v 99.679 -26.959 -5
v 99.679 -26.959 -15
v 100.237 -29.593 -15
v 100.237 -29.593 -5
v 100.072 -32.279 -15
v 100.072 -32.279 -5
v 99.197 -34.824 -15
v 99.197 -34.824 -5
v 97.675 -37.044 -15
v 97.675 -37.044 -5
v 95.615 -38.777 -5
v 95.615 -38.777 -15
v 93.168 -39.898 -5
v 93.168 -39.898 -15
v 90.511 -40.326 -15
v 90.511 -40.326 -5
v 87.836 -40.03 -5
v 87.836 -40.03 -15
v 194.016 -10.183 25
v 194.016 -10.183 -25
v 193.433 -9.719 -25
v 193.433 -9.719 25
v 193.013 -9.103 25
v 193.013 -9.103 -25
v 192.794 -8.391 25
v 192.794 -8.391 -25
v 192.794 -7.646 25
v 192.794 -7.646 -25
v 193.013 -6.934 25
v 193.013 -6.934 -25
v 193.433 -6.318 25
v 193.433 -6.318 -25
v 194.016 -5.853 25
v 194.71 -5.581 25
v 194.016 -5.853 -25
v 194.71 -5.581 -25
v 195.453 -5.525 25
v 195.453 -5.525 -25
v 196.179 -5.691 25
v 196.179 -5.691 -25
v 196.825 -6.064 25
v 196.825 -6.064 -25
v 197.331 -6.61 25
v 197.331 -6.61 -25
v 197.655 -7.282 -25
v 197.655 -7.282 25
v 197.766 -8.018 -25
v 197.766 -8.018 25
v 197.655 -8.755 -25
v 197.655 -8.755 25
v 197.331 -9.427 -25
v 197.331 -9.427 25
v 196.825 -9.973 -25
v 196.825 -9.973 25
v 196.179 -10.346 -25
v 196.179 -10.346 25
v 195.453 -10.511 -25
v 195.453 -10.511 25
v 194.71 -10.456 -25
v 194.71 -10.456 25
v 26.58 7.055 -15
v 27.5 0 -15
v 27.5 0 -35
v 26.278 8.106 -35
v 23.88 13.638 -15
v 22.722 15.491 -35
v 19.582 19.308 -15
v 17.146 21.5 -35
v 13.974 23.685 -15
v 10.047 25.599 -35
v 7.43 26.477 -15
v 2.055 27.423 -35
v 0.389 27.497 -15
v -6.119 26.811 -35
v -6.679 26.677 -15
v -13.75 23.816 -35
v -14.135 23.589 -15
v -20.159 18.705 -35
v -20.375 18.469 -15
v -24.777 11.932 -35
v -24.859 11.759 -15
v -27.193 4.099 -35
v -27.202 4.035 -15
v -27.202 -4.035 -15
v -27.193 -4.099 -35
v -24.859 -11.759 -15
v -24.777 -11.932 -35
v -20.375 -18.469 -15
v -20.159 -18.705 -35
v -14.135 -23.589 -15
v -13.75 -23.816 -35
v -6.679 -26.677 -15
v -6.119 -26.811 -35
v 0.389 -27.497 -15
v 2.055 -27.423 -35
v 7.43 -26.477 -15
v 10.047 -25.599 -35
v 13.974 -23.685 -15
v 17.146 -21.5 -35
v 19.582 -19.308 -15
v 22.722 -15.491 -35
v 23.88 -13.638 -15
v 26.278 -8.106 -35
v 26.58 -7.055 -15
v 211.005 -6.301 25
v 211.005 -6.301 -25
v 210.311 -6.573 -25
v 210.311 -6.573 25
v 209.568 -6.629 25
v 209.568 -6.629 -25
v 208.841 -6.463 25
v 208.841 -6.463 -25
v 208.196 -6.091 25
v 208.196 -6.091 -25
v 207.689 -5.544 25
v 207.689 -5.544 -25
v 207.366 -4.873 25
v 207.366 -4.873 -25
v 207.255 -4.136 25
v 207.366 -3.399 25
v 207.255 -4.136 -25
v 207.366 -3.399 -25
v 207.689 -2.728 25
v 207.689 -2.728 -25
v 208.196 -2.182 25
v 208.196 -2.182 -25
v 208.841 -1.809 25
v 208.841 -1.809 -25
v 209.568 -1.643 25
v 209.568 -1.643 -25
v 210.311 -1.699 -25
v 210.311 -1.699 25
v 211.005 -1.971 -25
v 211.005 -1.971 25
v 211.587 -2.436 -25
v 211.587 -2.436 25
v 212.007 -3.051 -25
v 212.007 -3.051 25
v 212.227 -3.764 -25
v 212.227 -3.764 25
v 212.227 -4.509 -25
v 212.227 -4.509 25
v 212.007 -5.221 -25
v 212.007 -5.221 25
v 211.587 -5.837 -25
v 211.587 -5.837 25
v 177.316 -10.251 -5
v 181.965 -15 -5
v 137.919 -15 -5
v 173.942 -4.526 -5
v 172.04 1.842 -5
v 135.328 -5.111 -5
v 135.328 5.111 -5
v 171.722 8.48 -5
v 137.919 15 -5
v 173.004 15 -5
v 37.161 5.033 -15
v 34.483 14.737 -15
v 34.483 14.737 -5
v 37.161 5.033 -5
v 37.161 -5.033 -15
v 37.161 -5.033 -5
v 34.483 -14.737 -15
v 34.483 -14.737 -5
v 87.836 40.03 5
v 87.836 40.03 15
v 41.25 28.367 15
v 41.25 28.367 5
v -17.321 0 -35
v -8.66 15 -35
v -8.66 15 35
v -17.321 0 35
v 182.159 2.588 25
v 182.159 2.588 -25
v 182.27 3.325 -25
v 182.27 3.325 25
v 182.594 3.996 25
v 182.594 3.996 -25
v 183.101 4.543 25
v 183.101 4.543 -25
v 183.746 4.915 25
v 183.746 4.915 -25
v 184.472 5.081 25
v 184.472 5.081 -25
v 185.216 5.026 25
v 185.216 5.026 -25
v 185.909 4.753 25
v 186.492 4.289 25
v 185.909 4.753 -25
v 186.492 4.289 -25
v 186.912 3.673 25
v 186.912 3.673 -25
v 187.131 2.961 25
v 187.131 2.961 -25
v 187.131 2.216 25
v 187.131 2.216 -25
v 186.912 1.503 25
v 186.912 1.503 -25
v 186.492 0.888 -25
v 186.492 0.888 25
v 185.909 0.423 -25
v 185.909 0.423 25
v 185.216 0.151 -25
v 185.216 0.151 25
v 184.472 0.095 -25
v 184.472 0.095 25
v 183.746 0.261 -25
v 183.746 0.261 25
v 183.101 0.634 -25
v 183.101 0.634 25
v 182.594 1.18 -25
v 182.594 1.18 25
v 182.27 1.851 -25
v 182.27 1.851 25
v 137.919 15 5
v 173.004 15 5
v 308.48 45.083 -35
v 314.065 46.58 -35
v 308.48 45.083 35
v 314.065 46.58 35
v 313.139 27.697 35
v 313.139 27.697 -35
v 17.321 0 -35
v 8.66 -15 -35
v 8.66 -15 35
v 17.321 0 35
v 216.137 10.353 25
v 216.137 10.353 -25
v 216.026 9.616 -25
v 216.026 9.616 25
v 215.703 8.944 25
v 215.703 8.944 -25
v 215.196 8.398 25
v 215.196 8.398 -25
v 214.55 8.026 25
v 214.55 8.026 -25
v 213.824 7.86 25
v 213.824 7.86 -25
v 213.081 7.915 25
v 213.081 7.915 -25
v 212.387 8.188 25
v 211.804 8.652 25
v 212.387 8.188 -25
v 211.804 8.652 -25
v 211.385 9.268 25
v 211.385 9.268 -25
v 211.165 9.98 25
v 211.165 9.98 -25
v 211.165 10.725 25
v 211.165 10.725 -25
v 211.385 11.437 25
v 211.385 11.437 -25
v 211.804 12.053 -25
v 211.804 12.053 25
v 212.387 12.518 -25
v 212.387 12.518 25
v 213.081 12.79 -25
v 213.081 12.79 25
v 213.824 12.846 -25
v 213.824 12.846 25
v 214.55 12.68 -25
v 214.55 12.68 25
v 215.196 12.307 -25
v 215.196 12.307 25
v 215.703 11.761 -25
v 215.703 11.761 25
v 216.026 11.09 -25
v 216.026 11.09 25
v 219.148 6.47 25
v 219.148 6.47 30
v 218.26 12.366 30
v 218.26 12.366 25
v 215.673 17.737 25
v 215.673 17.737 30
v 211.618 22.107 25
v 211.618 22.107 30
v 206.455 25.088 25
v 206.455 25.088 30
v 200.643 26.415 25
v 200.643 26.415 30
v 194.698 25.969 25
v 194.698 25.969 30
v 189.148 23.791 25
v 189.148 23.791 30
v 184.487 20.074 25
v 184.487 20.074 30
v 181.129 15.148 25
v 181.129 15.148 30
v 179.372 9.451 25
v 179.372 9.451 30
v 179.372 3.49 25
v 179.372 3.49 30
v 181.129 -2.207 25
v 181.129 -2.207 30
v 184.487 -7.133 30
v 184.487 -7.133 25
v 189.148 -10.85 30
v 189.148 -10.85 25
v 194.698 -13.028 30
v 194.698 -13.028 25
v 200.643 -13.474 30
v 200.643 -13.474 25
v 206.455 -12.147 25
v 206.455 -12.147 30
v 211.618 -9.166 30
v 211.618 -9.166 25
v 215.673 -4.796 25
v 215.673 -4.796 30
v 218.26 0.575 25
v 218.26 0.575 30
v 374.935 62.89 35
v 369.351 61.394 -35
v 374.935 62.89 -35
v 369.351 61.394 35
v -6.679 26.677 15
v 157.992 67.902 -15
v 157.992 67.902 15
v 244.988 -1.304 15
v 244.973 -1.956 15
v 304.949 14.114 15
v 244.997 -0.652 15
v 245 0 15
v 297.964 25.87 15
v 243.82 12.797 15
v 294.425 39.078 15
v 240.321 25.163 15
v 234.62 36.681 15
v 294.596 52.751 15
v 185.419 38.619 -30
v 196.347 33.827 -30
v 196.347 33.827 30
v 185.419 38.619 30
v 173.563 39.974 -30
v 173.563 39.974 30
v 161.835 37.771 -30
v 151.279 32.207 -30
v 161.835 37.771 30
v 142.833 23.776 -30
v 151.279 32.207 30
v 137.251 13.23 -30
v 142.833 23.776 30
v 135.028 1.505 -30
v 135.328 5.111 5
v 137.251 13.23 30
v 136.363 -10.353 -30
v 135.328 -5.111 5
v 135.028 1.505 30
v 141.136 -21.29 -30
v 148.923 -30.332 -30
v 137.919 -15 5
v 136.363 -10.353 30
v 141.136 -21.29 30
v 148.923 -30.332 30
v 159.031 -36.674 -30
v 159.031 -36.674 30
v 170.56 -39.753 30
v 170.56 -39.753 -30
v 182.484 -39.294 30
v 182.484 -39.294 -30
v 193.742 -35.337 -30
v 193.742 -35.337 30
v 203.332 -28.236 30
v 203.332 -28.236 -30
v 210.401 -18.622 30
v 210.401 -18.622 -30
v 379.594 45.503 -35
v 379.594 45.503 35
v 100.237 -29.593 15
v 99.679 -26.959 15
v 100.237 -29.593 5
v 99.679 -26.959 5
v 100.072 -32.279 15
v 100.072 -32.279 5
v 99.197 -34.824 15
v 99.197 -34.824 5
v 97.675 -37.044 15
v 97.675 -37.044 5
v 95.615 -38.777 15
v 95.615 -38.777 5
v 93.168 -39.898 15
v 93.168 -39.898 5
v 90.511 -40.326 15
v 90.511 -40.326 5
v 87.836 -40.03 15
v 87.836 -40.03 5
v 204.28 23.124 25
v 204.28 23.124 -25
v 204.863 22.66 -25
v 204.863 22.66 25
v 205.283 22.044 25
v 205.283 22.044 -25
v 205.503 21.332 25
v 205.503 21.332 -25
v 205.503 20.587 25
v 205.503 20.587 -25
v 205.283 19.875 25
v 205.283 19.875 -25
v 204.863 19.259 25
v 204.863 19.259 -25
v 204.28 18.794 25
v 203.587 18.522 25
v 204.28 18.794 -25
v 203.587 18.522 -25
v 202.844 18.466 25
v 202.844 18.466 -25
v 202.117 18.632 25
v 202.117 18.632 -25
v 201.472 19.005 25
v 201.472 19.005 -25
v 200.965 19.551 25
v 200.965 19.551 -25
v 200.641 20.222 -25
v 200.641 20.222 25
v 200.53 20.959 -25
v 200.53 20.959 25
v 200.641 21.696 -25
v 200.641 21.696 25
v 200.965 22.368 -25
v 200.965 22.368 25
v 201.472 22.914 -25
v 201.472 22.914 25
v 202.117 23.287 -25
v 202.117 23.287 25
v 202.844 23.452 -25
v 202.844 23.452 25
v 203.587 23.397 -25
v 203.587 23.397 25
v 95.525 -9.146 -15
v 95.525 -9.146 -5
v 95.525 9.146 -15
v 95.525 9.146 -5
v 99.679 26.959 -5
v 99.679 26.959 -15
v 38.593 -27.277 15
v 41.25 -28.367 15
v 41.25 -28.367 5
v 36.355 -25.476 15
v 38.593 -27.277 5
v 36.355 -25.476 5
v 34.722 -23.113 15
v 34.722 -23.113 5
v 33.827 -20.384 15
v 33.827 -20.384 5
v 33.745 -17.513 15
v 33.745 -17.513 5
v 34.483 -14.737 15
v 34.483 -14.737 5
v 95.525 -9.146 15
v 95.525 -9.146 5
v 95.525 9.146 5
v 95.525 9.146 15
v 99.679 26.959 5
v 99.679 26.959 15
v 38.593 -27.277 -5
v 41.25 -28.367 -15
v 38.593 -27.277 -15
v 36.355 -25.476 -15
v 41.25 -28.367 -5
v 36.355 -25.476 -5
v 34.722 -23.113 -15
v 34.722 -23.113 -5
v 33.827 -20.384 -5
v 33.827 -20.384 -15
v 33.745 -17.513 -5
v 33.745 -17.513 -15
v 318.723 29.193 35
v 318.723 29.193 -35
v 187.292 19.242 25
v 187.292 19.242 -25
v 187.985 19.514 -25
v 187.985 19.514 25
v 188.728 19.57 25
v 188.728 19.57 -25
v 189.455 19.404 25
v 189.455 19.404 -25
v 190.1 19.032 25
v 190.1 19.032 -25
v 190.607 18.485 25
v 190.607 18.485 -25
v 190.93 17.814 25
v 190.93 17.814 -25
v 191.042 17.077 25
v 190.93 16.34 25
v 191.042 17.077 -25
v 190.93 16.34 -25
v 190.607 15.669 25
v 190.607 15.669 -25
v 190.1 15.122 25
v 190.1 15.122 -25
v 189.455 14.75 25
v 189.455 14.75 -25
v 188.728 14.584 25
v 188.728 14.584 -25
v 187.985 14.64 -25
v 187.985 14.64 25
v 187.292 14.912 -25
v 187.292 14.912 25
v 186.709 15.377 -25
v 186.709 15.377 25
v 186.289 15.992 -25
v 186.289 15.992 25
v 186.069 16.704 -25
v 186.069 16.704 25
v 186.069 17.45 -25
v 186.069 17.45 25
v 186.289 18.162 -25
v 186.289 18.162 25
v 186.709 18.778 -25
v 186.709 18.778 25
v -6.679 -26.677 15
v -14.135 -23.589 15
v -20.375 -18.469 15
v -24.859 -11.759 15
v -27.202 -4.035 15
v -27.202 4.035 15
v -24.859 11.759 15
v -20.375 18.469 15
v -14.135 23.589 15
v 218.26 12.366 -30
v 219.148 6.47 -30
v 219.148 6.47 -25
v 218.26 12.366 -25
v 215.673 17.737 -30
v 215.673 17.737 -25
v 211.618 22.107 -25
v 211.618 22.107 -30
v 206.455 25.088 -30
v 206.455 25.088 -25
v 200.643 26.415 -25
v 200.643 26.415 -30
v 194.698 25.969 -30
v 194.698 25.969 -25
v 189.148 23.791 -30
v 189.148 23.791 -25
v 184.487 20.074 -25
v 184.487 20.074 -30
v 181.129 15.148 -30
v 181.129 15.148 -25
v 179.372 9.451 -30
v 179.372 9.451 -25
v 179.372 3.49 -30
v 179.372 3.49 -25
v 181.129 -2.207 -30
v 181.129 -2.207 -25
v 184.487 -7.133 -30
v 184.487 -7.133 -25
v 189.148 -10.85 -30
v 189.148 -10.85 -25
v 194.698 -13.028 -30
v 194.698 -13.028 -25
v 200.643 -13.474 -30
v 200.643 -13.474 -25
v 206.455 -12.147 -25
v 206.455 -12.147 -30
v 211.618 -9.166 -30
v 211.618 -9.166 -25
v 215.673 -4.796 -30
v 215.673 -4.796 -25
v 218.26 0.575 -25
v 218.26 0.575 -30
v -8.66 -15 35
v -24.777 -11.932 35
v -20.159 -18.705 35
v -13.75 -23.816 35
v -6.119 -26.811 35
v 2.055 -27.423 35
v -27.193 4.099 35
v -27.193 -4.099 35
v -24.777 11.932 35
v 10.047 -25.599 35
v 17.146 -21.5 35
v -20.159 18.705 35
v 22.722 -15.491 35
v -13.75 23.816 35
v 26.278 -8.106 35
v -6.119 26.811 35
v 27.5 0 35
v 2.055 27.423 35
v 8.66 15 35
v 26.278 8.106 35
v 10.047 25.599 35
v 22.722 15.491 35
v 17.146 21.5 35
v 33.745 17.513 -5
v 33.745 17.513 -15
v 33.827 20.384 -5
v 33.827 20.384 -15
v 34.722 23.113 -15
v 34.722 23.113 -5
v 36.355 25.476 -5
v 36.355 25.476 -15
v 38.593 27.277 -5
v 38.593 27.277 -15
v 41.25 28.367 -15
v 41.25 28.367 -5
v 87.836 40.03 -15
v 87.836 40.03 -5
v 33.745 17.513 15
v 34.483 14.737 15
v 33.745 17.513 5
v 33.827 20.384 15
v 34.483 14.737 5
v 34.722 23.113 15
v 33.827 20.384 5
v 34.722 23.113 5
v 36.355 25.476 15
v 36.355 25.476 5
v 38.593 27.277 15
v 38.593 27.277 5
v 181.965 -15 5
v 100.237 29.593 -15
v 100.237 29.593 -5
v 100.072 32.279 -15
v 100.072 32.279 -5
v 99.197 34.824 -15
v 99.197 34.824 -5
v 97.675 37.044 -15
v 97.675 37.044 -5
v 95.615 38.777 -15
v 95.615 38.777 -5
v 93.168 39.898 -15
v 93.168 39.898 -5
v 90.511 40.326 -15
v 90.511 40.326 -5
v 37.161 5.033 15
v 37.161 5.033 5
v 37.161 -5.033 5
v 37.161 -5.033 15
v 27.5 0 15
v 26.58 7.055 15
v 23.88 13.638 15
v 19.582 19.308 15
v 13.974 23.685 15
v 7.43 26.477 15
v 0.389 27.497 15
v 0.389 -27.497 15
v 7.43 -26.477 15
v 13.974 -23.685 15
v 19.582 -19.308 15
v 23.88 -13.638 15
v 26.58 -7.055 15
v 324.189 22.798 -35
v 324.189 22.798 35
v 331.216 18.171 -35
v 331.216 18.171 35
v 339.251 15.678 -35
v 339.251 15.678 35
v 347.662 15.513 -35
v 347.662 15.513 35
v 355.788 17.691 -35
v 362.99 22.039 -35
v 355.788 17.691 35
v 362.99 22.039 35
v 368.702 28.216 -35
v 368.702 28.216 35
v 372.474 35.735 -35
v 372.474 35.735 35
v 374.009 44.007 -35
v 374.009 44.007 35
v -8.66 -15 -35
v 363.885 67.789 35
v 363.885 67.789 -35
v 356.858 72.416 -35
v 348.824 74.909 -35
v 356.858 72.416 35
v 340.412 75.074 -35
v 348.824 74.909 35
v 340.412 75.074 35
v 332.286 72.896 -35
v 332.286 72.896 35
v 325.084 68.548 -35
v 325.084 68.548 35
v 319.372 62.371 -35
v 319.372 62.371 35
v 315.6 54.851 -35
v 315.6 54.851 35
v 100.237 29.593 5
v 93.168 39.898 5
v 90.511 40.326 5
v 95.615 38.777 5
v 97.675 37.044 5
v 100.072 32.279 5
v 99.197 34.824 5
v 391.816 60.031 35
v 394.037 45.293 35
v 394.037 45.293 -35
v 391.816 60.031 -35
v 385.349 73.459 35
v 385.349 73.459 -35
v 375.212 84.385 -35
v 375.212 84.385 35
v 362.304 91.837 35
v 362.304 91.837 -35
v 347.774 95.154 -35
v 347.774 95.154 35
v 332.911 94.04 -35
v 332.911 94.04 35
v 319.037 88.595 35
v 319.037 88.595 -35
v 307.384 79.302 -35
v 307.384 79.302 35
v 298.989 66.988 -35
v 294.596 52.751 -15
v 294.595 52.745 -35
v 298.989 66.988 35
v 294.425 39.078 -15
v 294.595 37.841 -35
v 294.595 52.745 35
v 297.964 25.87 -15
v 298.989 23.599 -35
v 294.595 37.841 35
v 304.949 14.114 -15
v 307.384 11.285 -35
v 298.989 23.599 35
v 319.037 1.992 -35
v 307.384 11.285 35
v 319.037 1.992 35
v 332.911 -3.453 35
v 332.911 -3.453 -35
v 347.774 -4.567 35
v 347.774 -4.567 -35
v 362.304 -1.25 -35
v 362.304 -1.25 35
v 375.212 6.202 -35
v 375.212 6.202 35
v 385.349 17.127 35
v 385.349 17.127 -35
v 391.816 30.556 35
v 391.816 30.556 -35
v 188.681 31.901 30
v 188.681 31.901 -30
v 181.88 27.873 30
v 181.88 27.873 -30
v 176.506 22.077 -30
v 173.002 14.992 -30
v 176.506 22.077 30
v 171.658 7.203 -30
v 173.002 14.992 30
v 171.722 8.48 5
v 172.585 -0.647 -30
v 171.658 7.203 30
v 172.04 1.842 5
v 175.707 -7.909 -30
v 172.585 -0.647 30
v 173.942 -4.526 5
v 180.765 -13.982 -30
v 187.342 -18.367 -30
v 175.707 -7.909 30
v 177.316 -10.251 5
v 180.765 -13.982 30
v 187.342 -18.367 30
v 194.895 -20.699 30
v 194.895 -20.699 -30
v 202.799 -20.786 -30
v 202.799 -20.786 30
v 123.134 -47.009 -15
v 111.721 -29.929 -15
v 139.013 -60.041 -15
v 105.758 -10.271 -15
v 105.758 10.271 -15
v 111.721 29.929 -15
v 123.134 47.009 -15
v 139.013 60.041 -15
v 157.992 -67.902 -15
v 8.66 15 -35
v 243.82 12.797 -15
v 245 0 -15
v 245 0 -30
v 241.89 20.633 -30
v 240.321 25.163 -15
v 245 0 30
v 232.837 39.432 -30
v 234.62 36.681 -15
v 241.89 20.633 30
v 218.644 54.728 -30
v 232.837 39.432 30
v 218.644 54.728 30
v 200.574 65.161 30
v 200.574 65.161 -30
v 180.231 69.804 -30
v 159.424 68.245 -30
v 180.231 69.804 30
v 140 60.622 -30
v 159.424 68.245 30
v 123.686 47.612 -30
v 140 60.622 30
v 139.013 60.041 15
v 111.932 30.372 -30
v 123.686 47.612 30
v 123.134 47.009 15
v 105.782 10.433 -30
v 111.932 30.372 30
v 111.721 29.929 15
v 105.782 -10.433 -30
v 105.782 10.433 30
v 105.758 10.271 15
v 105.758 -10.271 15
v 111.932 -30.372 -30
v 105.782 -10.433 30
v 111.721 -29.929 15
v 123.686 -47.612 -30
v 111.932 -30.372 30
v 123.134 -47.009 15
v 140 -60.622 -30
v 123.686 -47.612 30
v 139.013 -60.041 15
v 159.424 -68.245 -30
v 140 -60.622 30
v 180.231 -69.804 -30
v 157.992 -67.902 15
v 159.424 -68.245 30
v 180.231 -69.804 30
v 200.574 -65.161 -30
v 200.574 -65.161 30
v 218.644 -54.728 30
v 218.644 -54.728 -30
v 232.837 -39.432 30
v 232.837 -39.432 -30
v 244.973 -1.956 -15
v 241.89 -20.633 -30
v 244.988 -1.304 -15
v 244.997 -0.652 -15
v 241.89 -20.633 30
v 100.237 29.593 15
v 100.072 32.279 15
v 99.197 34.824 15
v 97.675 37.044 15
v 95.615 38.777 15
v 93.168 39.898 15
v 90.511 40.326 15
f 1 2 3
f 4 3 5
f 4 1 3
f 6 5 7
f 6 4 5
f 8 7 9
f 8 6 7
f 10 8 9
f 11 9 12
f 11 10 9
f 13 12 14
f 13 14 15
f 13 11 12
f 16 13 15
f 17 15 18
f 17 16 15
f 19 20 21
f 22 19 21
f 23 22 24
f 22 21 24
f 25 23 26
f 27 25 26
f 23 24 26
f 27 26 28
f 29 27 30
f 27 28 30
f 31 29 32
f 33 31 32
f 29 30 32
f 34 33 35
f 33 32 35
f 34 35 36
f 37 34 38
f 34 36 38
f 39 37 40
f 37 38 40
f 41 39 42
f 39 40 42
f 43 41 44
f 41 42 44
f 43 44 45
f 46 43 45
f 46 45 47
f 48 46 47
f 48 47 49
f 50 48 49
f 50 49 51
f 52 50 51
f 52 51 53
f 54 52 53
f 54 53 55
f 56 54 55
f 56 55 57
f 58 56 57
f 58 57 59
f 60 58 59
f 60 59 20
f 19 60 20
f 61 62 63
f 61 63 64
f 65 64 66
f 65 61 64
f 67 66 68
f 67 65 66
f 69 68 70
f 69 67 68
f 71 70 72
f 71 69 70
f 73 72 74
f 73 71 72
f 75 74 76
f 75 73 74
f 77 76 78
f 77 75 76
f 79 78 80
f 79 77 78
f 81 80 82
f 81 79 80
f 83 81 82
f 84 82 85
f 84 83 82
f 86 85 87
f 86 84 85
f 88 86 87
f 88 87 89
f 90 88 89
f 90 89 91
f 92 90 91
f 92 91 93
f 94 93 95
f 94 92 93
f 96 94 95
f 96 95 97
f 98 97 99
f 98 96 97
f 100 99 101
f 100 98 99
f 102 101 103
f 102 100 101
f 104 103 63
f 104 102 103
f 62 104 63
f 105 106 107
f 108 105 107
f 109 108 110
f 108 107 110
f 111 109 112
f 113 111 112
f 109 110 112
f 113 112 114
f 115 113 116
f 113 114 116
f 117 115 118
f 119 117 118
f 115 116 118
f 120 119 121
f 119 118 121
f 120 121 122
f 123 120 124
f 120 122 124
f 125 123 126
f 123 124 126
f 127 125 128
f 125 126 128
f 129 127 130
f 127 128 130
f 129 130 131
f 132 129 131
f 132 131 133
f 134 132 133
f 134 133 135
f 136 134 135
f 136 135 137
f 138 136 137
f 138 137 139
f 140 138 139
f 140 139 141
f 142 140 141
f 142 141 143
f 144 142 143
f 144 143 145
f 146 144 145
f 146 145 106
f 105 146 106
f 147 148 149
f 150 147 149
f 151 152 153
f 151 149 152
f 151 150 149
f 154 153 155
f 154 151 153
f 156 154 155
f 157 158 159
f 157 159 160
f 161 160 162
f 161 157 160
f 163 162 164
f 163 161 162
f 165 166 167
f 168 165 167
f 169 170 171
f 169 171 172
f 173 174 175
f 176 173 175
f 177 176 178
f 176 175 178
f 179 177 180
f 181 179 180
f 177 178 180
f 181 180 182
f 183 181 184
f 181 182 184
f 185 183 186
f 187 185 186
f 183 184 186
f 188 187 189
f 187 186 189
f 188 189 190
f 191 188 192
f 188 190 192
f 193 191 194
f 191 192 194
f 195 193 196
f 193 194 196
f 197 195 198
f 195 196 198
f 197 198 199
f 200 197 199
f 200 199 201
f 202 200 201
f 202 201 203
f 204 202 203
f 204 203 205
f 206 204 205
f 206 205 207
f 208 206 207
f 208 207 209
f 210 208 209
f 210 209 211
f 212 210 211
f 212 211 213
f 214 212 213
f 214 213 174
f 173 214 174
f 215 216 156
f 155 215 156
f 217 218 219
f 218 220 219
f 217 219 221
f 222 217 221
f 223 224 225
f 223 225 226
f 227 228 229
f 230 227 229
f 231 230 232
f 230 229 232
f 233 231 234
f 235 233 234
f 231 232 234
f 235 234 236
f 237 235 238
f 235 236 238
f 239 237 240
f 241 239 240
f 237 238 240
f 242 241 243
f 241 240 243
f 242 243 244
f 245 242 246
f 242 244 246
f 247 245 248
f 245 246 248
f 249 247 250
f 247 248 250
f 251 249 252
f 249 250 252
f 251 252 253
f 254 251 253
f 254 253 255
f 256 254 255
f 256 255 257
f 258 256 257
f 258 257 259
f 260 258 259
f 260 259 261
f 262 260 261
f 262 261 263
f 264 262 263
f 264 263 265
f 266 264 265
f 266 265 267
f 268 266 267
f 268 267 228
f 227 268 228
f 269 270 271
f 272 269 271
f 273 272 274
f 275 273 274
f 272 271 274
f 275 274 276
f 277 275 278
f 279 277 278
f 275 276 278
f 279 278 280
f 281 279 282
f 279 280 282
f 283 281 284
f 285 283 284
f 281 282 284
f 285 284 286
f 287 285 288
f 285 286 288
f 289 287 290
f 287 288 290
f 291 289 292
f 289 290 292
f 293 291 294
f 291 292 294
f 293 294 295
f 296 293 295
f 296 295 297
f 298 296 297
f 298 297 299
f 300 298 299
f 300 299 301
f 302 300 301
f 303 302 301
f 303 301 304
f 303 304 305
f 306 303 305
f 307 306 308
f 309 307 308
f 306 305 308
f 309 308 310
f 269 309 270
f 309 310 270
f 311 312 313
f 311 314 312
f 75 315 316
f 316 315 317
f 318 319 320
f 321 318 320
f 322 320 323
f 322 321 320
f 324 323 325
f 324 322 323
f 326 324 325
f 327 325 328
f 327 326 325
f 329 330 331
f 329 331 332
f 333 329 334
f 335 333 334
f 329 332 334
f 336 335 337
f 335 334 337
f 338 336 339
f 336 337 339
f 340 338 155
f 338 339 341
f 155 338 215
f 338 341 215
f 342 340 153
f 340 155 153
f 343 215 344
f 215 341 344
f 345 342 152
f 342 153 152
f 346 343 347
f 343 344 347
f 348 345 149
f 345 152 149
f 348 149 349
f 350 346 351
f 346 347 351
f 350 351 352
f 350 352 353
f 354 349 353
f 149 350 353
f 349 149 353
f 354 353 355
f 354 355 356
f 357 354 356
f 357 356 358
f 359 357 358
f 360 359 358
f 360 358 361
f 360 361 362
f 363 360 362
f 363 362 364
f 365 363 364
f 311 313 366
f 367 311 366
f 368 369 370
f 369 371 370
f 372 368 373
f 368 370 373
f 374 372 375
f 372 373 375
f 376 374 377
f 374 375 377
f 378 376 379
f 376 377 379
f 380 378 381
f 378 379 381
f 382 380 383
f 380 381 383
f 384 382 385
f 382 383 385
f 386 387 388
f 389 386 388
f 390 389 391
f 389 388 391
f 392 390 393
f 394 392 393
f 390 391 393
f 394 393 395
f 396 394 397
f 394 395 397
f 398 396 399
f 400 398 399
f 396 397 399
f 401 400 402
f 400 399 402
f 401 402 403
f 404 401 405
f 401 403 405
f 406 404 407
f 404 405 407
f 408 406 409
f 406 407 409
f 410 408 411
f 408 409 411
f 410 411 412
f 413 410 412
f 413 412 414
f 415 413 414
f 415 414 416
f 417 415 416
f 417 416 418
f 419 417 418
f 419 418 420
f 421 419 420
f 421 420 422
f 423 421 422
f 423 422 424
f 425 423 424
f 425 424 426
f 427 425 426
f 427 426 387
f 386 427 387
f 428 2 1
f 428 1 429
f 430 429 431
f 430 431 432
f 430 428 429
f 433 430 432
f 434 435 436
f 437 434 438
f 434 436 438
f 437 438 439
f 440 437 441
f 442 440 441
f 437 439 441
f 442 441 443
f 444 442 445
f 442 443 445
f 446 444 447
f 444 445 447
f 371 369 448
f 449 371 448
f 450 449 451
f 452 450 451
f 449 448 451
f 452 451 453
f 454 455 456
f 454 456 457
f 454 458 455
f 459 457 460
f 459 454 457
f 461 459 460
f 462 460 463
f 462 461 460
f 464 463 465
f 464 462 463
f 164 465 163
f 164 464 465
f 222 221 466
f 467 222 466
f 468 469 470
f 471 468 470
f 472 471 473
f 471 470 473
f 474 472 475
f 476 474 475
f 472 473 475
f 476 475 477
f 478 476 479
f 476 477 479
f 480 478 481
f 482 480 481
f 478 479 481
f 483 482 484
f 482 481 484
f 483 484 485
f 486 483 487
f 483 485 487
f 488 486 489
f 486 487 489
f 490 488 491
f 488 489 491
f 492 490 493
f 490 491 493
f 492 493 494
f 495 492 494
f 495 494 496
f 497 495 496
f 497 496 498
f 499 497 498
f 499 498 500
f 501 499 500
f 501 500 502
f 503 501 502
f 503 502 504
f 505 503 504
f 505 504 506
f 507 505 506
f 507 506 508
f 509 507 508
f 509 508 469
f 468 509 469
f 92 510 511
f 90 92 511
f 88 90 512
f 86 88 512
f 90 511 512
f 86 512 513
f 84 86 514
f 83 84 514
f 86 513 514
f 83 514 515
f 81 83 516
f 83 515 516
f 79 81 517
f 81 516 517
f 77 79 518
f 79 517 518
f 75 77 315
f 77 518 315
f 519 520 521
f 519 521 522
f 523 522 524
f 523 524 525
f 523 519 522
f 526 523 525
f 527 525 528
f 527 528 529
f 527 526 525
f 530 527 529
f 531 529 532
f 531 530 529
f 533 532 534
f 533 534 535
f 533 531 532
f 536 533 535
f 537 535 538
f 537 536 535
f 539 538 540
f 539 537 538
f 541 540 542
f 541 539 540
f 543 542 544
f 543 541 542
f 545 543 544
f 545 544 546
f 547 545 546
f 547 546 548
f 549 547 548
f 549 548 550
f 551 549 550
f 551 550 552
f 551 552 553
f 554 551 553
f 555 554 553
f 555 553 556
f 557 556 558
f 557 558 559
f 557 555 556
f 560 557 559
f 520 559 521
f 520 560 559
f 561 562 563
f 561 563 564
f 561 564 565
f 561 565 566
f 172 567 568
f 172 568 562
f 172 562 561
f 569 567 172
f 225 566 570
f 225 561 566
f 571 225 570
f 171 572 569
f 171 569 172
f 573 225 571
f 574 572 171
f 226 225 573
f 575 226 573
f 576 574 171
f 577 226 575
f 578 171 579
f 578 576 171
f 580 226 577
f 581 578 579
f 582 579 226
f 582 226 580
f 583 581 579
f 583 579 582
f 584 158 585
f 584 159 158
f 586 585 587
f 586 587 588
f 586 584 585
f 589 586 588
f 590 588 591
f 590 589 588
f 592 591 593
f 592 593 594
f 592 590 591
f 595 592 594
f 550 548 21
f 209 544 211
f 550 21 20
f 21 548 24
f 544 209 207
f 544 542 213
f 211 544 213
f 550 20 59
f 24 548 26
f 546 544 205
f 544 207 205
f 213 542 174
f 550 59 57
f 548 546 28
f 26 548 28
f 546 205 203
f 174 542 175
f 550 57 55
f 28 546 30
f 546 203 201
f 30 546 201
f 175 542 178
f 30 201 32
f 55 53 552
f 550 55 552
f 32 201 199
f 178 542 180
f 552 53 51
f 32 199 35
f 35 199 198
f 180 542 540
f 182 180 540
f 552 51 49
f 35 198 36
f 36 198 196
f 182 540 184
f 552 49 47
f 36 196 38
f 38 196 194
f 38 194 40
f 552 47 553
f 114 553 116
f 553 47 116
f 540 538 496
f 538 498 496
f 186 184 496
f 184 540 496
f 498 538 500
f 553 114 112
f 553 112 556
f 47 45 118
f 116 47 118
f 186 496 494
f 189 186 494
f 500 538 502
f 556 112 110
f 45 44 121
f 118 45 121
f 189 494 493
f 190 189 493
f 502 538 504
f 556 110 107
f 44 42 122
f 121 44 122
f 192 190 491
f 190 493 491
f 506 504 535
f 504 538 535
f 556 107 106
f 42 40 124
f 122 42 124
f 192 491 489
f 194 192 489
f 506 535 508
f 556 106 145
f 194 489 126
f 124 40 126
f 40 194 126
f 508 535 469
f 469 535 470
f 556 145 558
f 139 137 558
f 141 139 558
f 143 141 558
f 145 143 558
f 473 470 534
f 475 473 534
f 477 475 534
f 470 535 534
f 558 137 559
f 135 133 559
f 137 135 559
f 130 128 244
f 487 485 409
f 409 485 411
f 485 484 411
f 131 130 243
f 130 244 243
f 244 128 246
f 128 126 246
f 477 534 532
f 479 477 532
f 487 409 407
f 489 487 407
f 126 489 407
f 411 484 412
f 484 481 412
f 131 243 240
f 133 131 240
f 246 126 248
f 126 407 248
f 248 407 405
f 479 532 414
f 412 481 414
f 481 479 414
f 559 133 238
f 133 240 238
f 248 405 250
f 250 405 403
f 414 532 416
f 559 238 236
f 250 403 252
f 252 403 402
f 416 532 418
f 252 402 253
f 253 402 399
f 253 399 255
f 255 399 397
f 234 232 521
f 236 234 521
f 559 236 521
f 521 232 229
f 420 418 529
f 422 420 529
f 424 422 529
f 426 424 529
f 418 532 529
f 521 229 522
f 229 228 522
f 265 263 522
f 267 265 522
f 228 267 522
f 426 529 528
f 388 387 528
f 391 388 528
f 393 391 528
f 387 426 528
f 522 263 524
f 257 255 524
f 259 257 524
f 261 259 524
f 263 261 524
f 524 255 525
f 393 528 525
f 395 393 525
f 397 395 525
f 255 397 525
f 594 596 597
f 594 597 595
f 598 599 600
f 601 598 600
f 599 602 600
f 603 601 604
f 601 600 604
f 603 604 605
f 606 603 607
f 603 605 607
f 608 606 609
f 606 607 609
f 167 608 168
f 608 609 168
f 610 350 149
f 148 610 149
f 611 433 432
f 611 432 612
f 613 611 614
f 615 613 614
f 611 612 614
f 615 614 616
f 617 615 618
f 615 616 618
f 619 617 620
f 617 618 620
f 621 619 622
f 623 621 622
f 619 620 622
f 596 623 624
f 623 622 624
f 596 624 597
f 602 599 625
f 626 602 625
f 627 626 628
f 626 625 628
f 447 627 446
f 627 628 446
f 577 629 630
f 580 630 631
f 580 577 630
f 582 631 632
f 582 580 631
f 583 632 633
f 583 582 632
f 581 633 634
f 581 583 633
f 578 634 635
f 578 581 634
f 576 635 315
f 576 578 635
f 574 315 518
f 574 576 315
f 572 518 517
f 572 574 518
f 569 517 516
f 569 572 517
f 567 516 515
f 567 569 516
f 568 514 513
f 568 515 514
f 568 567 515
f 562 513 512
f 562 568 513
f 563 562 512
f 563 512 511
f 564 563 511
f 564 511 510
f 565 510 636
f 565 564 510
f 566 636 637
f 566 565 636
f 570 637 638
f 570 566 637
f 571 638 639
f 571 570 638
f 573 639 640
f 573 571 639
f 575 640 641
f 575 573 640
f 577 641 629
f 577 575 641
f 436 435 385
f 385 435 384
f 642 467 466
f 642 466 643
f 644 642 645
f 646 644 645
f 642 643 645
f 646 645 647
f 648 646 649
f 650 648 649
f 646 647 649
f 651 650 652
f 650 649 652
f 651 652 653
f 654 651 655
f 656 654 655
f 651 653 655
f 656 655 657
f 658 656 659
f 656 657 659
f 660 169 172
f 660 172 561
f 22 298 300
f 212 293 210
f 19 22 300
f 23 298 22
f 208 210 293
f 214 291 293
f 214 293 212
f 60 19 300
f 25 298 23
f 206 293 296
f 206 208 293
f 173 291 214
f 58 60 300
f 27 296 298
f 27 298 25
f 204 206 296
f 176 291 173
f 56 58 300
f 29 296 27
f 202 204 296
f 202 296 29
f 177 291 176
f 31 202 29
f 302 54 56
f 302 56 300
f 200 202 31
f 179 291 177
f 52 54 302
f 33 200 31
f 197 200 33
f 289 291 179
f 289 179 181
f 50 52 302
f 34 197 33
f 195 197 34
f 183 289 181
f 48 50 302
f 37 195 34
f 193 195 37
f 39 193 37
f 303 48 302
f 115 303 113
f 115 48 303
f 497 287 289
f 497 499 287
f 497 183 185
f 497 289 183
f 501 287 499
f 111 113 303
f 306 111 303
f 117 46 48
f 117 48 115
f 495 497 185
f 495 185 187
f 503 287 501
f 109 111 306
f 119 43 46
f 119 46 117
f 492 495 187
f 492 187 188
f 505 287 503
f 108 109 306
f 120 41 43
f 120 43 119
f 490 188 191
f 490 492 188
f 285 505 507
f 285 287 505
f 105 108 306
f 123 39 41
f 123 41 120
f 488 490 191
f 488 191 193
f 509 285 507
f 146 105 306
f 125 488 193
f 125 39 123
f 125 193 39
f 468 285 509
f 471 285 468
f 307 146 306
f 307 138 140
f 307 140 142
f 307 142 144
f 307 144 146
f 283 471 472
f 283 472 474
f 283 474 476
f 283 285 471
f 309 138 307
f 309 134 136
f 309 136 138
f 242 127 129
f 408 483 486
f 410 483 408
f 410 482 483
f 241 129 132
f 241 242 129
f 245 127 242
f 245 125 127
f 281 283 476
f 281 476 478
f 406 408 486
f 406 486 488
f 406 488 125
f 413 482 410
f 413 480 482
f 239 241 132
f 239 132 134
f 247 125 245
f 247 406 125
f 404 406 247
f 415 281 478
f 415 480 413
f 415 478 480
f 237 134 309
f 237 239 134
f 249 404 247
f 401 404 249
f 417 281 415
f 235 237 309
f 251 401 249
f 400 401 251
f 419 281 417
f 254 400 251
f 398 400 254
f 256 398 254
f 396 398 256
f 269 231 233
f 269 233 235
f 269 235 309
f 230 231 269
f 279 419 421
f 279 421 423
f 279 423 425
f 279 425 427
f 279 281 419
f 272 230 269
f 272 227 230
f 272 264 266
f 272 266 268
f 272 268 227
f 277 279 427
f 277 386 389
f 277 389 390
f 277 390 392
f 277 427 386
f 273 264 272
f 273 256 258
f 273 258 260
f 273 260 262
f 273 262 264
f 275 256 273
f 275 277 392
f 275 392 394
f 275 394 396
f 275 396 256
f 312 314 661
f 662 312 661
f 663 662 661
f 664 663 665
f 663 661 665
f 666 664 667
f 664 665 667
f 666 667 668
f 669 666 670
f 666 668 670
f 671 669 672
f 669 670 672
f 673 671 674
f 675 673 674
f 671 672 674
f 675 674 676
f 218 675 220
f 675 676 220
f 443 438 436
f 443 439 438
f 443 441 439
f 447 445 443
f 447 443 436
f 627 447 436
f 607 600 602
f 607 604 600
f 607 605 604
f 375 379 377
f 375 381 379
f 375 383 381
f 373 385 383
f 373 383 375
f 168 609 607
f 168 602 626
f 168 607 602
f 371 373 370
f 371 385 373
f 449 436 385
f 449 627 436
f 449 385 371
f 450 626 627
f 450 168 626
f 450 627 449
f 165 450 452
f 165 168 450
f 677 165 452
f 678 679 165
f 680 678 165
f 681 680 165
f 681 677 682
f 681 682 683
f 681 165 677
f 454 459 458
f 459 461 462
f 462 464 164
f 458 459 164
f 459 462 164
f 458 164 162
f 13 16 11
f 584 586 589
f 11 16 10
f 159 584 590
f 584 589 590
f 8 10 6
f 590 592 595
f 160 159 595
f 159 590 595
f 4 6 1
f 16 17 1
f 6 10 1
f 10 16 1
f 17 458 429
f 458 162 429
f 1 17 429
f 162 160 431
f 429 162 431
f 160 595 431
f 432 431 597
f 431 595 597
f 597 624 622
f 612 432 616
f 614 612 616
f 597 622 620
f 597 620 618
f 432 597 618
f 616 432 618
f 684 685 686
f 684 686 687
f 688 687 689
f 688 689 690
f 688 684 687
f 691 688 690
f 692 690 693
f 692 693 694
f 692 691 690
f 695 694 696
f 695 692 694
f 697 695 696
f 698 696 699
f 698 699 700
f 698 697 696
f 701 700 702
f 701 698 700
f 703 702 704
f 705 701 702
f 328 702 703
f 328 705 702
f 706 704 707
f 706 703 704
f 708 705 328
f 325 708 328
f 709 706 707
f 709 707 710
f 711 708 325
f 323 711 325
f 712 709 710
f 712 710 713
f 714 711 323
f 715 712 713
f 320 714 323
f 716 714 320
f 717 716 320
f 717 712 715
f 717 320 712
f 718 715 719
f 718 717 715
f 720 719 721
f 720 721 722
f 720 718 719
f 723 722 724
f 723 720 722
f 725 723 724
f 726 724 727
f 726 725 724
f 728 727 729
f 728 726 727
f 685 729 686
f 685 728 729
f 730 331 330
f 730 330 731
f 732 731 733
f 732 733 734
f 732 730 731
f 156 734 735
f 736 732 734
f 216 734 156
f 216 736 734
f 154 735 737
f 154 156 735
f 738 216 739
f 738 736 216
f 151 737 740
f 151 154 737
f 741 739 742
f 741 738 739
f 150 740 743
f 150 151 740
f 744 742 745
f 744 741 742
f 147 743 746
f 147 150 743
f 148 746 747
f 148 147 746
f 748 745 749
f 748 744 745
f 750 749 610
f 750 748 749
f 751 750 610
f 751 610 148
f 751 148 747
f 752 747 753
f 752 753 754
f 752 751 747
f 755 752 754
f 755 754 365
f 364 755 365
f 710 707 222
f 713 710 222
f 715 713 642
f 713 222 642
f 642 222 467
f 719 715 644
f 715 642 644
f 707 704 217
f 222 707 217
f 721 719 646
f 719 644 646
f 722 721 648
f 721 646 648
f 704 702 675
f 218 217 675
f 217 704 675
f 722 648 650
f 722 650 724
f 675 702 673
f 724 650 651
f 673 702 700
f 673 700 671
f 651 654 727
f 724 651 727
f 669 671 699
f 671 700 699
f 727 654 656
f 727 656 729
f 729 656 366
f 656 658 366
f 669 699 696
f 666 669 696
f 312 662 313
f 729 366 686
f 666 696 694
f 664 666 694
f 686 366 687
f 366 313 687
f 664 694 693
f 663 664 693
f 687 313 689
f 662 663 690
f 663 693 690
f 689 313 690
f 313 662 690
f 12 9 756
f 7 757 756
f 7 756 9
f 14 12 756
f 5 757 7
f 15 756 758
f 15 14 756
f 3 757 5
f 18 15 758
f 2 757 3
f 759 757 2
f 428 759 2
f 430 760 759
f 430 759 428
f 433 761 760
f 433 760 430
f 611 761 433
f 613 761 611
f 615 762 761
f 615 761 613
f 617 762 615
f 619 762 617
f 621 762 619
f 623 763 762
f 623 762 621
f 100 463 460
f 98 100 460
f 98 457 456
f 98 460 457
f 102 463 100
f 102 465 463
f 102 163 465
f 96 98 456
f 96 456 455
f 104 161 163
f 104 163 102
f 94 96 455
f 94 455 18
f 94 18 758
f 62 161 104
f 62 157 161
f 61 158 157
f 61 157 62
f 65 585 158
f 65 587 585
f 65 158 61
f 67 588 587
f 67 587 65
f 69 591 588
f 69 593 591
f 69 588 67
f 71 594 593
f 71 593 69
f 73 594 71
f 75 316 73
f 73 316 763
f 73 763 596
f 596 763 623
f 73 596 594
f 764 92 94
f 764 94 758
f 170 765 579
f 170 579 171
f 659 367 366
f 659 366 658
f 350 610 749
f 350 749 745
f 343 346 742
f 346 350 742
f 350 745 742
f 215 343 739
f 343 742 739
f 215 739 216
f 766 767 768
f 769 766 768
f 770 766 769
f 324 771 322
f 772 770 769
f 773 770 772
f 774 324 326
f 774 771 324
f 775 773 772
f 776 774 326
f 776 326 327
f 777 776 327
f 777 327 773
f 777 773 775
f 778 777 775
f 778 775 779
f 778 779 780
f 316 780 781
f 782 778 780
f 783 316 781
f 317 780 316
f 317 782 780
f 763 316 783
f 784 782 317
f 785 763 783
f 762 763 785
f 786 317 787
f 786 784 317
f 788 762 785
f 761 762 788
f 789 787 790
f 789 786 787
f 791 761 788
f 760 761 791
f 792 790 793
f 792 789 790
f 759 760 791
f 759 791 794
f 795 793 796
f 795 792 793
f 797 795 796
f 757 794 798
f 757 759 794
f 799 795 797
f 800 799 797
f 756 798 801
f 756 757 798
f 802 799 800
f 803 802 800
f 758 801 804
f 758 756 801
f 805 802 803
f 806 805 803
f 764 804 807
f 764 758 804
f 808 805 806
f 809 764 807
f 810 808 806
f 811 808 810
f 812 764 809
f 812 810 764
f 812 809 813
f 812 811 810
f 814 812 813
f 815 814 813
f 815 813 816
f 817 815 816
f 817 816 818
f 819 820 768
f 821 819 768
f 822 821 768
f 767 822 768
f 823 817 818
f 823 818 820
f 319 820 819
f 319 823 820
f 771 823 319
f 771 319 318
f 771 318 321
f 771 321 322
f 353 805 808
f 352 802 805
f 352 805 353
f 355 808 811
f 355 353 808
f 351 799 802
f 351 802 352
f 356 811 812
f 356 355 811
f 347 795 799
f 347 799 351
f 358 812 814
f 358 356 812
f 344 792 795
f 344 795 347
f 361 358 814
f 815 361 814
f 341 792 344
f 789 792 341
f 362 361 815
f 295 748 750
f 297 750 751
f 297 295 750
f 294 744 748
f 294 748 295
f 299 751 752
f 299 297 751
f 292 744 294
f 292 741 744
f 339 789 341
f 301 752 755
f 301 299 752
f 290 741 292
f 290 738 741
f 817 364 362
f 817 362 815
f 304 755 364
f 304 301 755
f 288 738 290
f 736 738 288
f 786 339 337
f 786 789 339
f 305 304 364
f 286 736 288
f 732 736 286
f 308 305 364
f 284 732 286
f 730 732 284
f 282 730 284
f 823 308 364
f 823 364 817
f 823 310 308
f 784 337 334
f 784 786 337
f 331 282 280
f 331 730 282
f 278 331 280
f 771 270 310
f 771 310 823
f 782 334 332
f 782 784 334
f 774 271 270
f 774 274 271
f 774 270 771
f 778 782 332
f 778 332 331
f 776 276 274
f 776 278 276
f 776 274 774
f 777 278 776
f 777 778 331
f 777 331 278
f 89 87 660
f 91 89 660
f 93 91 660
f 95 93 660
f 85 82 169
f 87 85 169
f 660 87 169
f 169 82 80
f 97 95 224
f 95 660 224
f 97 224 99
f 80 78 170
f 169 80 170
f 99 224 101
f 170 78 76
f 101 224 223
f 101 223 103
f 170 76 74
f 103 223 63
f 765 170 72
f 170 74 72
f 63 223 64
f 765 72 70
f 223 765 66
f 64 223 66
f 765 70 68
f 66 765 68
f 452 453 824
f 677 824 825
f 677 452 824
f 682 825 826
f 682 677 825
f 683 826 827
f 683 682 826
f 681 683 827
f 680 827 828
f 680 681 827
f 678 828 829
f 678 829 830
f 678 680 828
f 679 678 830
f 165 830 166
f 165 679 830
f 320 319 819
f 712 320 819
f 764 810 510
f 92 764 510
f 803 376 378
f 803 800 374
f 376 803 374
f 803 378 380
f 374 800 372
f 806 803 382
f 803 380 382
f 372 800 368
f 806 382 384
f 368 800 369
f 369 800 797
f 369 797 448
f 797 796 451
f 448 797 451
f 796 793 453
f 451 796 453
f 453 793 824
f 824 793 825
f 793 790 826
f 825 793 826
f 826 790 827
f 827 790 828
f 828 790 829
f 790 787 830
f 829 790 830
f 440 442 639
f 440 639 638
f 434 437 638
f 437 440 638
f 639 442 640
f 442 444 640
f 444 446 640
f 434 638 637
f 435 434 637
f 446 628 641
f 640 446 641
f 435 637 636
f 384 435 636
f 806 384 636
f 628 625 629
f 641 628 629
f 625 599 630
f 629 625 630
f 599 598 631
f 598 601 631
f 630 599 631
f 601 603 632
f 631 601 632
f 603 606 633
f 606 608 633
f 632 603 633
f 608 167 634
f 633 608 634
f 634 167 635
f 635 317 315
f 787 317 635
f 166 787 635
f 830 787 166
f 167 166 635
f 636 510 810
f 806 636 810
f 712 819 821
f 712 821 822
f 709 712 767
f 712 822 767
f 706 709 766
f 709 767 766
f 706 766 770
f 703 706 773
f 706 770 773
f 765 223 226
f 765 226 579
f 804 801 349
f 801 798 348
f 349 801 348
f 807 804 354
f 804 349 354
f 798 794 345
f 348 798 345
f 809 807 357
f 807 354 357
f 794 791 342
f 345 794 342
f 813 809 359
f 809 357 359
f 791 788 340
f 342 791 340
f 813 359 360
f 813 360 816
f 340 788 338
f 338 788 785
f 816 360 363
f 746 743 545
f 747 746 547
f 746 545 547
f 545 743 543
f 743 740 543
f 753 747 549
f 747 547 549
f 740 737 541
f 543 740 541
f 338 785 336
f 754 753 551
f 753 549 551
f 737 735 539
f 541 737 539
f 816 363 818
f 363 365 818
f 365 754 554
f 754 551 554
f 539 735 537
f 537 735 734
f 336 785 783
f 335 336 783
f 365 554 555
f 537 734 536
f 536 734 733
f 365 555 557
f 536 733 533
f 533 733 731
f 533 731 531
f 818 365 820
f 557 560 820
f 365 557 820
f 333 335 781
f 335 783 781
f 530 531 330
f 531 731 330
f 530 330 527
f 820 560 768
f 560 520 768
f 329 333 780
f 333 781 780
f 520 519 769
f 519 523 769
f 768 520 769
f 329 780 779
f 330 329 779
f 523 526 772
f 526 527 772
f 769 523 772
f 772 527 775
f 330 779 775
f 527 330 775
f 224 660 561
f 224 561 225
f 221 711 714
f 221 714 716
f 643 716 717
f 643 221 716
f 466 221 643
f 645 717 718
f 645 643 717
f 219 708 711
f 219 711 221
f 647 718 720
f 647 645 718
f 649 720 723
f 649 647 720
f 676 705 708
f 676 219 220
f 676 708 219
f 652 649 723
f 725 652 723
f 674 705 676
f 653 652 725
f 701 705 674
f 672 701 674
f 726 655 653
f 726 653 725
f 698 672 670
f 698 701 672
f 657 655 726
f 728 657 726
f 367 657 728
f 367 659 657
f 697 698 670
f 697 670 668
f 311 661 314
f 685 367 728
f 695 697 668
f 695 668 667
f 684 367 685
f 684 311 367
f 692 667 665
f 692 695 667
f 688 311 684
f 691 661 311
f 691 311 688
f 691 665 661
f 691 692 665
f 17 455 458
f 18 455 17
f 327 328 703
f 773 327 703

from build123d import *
from build123d.topology import SkipClean

# Parameters (mm, degrees)
LEFT_ARM_DEPTH                = 15
SKETCH2_R                     = 27.5
LEFT_BOSS_DEPTH               = 35
LEFT_HEX_DEPTH                = 265.244205
LEFT_HEX_DEPTH_BACK           = 265.244205
SKETCH3_R                     = 70
CENTRE_BOSS_DEPTH             = 30
SKETCH5_W                     = 30
SKETCH5_H                     = 40
RIGHT_ARM_DEPTH               = 175
SKETCH7_R                     = 50
RIGHT_BOSS_DEPTH              = 35
SKETCH8_R                     = 30
RIGHT_BOSS_HOLE_DEPTH         = 412.395178
SKETCH9_R                     = 40
CENTRE_HOLE_DEPTH             = 411.573979
SKETCH10_R                    = 27.5
CENTRE_BLOB_DEPTH             = 30
CENTRE_BEAM_REACH             = 243.419
SKETCH11_W                    = 10
SKETCH11_H                    = 30
CENTRE_BEAM_DIRECTION_2_REACH = 243.419
SKETCH12_R                    = 20
CUT_EXTRUDE4_DEPTH            = 5
M6X1_0_TAPPED_HOLE1_D         = 5
CIRPATTERN1_COUNT             = 6
CUT_OUT_DEPTH                 = 10
FILLET1_R                     = 10
FILLET1_OF_MIRROR2_R          = 10
KEYWAY_DEPTH                  = 407.904156


with BuildPart() as part:
    # Sketch1 → LEFT_ARM (new, symmetric)
    with BuildSketch(Plane.XY):
        with BuildLine():
            Line((-6.678571, 26.676707), (158, 67.904344))
            ThreePointArc((158, 67.904344), (245, 0), (158, -67.904344))
            Line((158, -67.904344), (-6.678571, -26.676707))
            ThreePointArc((-6.678571, -26.676707), (-27.5, 0), (-6.678571, 26.676707))
        make_face()
    extrude(amount=LEFT_ARM_DEPTH, both=True)

    # Sketch2 → LEFT_Boss (add, symmetric)
    with SkipClean():  # the faces are left unmerged after this step: merging them gives an invalid solid
        with BuildSketch(Plane.XY):
            Circle(SKETCH2_R)
        extrude(amount=LEFT_BOSS_DEPTH, both=True)

    # Sketch4 → LEFT_Hex (cut, two sides: drawn at the far end of the back side and taken through both)
    with SkipClean():  # the faces are left unmerged after this step: merging them gives an invalid solid
        with BuildSketch(Plane.XY.offset(35).offset(-LEFT_HEX_DEPTH_BACK)):
            Polygon((17.320508, 0), (8.660254, 15), (-8.660254, 15), (-17.320508, 0), (-8.660254, -15), (8.660254, -15), align=None)
        extrude(amount=LEFT_HEX_DEPTH + LEFT_HEX_DEPTH_BACK, mode=Mode.SUBTRACT)

    # Sketch3 → CENTRE_Boss (add, symmetric)
    with BuildSketch(Plane.XY):
        with Locations((175, 0)):
            Circle(SKETCH3_R)
    extrude(amount=CENTRE_BOSS_DEPTH, both=True)

    # Sketch5 → RIGHT_ARM (add)
    with BuildSketch(Plane(origin=(163.277223, 43.75, 0), x_dir=(0, 0, -1), z_dir=(0.9659258262890681, 0.25881904510252135, 0))):
        with Locations((0, -45.293333)):
            Rectangle(SKETCH5_W, SKETCH5_H)
    extrude(amount=RIGHT_ARM_DEPTH)

    # Sketch7 → RIGHT_Boss (add, symmetric)
    with BuildSketch(Plane.XY):
        with Locations((344.03702, 45.293333)):
            Circle(SKETCH7_R)
    extrude(amount=RIGHT_BOSS_DEPTH, both=True)

    # Sketch8 → RIGHT_Boss_Hole (cut, through all)
    with BuildSketch(Plane.XY.offset(35)):
        with Locations((344.03702, 45.293333)):
            Circle(SKETCH8_R)
    extrude(amount=-RIGHT_BOSS_HOLE_DEPTH, mode=Mode.SUBTRACT)

    # Sketch9 → CENTRE_Hole (cut, through all)
    with BuildSketch(Plane.XY.offset(30)):
        with Locations((175, 0)):
            Circle(SKETCH9_R)
    extrude(amount=-CENTRE_HOLE_DEPTH, mode=Mode.SUBTRACT)

    # Sketch10 → CENTRE_Blob (add, symmetric)
    with BuildSketch(Plane.XY):
        with Locations((199.148146, 6.470476)):
            Circle(SKETCH10_R)
    extrude(amount=CENTRE_BLOB_DEPTH, both=True)

    # Sketch11 → CENTRE_Beam (add, up to next)
    with BuildSketch(Plane(origin=(175, 0, 0), x_dir=(0, 0, -1), z_dir=(1, 0, 0)), mode=Mode.PRIVATE) as centre_beam_sk1:
        Rectangle(SKETCH11_W, SKETCH11_H)
    centre_beam_tool1 = extrude(centre_beam_sk1.sketch, amount=CENTRE_BEAM_REACH, mode=Mode.PRIVATE) - part.part
    add(centre_beam_tool1.solids().sort_by_distance((175, 0, 0))[0])

    # Sketch11 → CENTRE_Beam direction 2 (add, up to next)
    with BuildSketch(Plane(origin=(175, 0, 0), x_dir=(0, 0, -1), z_dir=(1, 0, 0)), mode=Mode.PRIVATE) as centre_beam_direction_2_sk1:
        Rectangle(SKETCH11_W, SKETCH11_H)
    centre_beam_direction_2_tool1 = extrude(centre_beam_direction_2_sk1.sketch, amount=-CENTRE_BEAM_DIRECTION_2_REACH, mode=Mode.PRIVATE) - part.part
    add(centre_beam_direction_2_tool1.solids().sort_by_distance((175, 0, 0))[0])

    # Sketch12 → Cut-Extrude4 (cut)
    with BuildSketch(Plane.XY.offset(30)):
        with Locations((199.148146, 6.470476)):
            Circle(SKETCH12_R)
    cut_extrude4 = extrude(amount=-CUT_EXTRUDE4_DEPTH, mode=Mode.SUBTRACT)

    # M6x1.0 Tapped Hole1 (through all)
    with Locations(Plane.XY.offset(25)):
        with Locations((184.659258, 2.58819)):
            m6x1_0_tapped_hole1 = Hole(M6X1_0_TAPPED_HOLE1_D / 2)

    # CirPattern1: M6x1.0 Tapped Hole1 ×6 about axis
    cirpattern1_axis = Axis((199.148146, 6.470476, 0), (0, 0, 1))
    for i in range(1, CIRPATTERN1_COUNT):
        add(m6x1_0_tapped_hole1.rotate(cirpattern1_axis, i * 360 / CIRPATTERN1_COUNT), mode=Mode.SUBTRACT)

    # Mirror1: Cut-Extrude4 across plane
    add(cut_extrude4.mirror(Plane.XY), mode=Mode.SUBTRACT)

    # Sketch15 → Cut_OUT (cut)
    with BuildSketch(Plane.XY.offset(15)):
        with BuildLine():
            Line((109.097712, 45.352932), (27.923319, 25.030746))
            ThreePointArc((27.923319, 25.030746), (37.5, 0), (27.923319, -25.030746))
            Line((27.923319, -25.030746), (109.097712, -45.352932))
            ThreePointArc((109.097712, -45.352932), (95, 0), (109.097712, 45.352932))
        make_face()
    cut_out = extrude(amount=-CUT_OUT_DEPTH, mode=Mode.SUBTRACT)

    # Fillet1
    fillet1_edges = [part.edges().sort_by_distance(p)[0] for p in [
        (27.923319, -25.030746, 10),
        (27.923319, 25.030746, 10),
        (109.097712, 45.352932, 10),
        (109.097712, -45.352932, 10),
    ]]
    fillet(fillet1_edges, radius=FILLET1_R)

    # Mirror2: Cut_OUT across plane
    with SkipClean():  # the faces are left unmerged after this step: merging them gives an invalid solid
        add(cut_out.mirror(Plane.XY), mode=Mode.SUBTRACT)

    # Fillet1 of Mirror2
    fillet1_of_mirror2_edges = [part.edges().sort_by_distance(p)[0] for p in [
        (27.923319, -25.030746, -10),
        (27.923319, 25.030746, -10),
        (109.097712, 45.352932, -10),
        (109.097712, -45.352932, -10),
    ]]
    fillet(fillet1_of_mirror2_edges, radius=FILLET1_OF_MIRROR2_R)

    # Sketch16 → KEYWAY (cut, symmetric)
    with SkipClean():  # the faces are left unmerged after this step: merging them gives an invalid solid
        with BuildSketch(Plane.XY):
            Polygon((346.366391, 36.6), (341.707648, 53.986665), (308.4798, 45.08329), (313.138543, 27.696625), align=None)
        keyway = extrude(amount=KEYWAY_DEPTH, both=True, mode=Mode.SUBTRACT)

    # Mirror3: KEYWAY across plane
    with SkipClean():  # the faces are left unmerged after this step: merging them gives an invalid solid
        add(keyway.mirror(Plane(origin=(332.314242, 89.043333, 0), x_dir=(0, 0, 1), z_dir=(0.9659258262890681, 0.25881904510252135, 0))), mode=Mode.SUBTRACT)


solid = part.part
